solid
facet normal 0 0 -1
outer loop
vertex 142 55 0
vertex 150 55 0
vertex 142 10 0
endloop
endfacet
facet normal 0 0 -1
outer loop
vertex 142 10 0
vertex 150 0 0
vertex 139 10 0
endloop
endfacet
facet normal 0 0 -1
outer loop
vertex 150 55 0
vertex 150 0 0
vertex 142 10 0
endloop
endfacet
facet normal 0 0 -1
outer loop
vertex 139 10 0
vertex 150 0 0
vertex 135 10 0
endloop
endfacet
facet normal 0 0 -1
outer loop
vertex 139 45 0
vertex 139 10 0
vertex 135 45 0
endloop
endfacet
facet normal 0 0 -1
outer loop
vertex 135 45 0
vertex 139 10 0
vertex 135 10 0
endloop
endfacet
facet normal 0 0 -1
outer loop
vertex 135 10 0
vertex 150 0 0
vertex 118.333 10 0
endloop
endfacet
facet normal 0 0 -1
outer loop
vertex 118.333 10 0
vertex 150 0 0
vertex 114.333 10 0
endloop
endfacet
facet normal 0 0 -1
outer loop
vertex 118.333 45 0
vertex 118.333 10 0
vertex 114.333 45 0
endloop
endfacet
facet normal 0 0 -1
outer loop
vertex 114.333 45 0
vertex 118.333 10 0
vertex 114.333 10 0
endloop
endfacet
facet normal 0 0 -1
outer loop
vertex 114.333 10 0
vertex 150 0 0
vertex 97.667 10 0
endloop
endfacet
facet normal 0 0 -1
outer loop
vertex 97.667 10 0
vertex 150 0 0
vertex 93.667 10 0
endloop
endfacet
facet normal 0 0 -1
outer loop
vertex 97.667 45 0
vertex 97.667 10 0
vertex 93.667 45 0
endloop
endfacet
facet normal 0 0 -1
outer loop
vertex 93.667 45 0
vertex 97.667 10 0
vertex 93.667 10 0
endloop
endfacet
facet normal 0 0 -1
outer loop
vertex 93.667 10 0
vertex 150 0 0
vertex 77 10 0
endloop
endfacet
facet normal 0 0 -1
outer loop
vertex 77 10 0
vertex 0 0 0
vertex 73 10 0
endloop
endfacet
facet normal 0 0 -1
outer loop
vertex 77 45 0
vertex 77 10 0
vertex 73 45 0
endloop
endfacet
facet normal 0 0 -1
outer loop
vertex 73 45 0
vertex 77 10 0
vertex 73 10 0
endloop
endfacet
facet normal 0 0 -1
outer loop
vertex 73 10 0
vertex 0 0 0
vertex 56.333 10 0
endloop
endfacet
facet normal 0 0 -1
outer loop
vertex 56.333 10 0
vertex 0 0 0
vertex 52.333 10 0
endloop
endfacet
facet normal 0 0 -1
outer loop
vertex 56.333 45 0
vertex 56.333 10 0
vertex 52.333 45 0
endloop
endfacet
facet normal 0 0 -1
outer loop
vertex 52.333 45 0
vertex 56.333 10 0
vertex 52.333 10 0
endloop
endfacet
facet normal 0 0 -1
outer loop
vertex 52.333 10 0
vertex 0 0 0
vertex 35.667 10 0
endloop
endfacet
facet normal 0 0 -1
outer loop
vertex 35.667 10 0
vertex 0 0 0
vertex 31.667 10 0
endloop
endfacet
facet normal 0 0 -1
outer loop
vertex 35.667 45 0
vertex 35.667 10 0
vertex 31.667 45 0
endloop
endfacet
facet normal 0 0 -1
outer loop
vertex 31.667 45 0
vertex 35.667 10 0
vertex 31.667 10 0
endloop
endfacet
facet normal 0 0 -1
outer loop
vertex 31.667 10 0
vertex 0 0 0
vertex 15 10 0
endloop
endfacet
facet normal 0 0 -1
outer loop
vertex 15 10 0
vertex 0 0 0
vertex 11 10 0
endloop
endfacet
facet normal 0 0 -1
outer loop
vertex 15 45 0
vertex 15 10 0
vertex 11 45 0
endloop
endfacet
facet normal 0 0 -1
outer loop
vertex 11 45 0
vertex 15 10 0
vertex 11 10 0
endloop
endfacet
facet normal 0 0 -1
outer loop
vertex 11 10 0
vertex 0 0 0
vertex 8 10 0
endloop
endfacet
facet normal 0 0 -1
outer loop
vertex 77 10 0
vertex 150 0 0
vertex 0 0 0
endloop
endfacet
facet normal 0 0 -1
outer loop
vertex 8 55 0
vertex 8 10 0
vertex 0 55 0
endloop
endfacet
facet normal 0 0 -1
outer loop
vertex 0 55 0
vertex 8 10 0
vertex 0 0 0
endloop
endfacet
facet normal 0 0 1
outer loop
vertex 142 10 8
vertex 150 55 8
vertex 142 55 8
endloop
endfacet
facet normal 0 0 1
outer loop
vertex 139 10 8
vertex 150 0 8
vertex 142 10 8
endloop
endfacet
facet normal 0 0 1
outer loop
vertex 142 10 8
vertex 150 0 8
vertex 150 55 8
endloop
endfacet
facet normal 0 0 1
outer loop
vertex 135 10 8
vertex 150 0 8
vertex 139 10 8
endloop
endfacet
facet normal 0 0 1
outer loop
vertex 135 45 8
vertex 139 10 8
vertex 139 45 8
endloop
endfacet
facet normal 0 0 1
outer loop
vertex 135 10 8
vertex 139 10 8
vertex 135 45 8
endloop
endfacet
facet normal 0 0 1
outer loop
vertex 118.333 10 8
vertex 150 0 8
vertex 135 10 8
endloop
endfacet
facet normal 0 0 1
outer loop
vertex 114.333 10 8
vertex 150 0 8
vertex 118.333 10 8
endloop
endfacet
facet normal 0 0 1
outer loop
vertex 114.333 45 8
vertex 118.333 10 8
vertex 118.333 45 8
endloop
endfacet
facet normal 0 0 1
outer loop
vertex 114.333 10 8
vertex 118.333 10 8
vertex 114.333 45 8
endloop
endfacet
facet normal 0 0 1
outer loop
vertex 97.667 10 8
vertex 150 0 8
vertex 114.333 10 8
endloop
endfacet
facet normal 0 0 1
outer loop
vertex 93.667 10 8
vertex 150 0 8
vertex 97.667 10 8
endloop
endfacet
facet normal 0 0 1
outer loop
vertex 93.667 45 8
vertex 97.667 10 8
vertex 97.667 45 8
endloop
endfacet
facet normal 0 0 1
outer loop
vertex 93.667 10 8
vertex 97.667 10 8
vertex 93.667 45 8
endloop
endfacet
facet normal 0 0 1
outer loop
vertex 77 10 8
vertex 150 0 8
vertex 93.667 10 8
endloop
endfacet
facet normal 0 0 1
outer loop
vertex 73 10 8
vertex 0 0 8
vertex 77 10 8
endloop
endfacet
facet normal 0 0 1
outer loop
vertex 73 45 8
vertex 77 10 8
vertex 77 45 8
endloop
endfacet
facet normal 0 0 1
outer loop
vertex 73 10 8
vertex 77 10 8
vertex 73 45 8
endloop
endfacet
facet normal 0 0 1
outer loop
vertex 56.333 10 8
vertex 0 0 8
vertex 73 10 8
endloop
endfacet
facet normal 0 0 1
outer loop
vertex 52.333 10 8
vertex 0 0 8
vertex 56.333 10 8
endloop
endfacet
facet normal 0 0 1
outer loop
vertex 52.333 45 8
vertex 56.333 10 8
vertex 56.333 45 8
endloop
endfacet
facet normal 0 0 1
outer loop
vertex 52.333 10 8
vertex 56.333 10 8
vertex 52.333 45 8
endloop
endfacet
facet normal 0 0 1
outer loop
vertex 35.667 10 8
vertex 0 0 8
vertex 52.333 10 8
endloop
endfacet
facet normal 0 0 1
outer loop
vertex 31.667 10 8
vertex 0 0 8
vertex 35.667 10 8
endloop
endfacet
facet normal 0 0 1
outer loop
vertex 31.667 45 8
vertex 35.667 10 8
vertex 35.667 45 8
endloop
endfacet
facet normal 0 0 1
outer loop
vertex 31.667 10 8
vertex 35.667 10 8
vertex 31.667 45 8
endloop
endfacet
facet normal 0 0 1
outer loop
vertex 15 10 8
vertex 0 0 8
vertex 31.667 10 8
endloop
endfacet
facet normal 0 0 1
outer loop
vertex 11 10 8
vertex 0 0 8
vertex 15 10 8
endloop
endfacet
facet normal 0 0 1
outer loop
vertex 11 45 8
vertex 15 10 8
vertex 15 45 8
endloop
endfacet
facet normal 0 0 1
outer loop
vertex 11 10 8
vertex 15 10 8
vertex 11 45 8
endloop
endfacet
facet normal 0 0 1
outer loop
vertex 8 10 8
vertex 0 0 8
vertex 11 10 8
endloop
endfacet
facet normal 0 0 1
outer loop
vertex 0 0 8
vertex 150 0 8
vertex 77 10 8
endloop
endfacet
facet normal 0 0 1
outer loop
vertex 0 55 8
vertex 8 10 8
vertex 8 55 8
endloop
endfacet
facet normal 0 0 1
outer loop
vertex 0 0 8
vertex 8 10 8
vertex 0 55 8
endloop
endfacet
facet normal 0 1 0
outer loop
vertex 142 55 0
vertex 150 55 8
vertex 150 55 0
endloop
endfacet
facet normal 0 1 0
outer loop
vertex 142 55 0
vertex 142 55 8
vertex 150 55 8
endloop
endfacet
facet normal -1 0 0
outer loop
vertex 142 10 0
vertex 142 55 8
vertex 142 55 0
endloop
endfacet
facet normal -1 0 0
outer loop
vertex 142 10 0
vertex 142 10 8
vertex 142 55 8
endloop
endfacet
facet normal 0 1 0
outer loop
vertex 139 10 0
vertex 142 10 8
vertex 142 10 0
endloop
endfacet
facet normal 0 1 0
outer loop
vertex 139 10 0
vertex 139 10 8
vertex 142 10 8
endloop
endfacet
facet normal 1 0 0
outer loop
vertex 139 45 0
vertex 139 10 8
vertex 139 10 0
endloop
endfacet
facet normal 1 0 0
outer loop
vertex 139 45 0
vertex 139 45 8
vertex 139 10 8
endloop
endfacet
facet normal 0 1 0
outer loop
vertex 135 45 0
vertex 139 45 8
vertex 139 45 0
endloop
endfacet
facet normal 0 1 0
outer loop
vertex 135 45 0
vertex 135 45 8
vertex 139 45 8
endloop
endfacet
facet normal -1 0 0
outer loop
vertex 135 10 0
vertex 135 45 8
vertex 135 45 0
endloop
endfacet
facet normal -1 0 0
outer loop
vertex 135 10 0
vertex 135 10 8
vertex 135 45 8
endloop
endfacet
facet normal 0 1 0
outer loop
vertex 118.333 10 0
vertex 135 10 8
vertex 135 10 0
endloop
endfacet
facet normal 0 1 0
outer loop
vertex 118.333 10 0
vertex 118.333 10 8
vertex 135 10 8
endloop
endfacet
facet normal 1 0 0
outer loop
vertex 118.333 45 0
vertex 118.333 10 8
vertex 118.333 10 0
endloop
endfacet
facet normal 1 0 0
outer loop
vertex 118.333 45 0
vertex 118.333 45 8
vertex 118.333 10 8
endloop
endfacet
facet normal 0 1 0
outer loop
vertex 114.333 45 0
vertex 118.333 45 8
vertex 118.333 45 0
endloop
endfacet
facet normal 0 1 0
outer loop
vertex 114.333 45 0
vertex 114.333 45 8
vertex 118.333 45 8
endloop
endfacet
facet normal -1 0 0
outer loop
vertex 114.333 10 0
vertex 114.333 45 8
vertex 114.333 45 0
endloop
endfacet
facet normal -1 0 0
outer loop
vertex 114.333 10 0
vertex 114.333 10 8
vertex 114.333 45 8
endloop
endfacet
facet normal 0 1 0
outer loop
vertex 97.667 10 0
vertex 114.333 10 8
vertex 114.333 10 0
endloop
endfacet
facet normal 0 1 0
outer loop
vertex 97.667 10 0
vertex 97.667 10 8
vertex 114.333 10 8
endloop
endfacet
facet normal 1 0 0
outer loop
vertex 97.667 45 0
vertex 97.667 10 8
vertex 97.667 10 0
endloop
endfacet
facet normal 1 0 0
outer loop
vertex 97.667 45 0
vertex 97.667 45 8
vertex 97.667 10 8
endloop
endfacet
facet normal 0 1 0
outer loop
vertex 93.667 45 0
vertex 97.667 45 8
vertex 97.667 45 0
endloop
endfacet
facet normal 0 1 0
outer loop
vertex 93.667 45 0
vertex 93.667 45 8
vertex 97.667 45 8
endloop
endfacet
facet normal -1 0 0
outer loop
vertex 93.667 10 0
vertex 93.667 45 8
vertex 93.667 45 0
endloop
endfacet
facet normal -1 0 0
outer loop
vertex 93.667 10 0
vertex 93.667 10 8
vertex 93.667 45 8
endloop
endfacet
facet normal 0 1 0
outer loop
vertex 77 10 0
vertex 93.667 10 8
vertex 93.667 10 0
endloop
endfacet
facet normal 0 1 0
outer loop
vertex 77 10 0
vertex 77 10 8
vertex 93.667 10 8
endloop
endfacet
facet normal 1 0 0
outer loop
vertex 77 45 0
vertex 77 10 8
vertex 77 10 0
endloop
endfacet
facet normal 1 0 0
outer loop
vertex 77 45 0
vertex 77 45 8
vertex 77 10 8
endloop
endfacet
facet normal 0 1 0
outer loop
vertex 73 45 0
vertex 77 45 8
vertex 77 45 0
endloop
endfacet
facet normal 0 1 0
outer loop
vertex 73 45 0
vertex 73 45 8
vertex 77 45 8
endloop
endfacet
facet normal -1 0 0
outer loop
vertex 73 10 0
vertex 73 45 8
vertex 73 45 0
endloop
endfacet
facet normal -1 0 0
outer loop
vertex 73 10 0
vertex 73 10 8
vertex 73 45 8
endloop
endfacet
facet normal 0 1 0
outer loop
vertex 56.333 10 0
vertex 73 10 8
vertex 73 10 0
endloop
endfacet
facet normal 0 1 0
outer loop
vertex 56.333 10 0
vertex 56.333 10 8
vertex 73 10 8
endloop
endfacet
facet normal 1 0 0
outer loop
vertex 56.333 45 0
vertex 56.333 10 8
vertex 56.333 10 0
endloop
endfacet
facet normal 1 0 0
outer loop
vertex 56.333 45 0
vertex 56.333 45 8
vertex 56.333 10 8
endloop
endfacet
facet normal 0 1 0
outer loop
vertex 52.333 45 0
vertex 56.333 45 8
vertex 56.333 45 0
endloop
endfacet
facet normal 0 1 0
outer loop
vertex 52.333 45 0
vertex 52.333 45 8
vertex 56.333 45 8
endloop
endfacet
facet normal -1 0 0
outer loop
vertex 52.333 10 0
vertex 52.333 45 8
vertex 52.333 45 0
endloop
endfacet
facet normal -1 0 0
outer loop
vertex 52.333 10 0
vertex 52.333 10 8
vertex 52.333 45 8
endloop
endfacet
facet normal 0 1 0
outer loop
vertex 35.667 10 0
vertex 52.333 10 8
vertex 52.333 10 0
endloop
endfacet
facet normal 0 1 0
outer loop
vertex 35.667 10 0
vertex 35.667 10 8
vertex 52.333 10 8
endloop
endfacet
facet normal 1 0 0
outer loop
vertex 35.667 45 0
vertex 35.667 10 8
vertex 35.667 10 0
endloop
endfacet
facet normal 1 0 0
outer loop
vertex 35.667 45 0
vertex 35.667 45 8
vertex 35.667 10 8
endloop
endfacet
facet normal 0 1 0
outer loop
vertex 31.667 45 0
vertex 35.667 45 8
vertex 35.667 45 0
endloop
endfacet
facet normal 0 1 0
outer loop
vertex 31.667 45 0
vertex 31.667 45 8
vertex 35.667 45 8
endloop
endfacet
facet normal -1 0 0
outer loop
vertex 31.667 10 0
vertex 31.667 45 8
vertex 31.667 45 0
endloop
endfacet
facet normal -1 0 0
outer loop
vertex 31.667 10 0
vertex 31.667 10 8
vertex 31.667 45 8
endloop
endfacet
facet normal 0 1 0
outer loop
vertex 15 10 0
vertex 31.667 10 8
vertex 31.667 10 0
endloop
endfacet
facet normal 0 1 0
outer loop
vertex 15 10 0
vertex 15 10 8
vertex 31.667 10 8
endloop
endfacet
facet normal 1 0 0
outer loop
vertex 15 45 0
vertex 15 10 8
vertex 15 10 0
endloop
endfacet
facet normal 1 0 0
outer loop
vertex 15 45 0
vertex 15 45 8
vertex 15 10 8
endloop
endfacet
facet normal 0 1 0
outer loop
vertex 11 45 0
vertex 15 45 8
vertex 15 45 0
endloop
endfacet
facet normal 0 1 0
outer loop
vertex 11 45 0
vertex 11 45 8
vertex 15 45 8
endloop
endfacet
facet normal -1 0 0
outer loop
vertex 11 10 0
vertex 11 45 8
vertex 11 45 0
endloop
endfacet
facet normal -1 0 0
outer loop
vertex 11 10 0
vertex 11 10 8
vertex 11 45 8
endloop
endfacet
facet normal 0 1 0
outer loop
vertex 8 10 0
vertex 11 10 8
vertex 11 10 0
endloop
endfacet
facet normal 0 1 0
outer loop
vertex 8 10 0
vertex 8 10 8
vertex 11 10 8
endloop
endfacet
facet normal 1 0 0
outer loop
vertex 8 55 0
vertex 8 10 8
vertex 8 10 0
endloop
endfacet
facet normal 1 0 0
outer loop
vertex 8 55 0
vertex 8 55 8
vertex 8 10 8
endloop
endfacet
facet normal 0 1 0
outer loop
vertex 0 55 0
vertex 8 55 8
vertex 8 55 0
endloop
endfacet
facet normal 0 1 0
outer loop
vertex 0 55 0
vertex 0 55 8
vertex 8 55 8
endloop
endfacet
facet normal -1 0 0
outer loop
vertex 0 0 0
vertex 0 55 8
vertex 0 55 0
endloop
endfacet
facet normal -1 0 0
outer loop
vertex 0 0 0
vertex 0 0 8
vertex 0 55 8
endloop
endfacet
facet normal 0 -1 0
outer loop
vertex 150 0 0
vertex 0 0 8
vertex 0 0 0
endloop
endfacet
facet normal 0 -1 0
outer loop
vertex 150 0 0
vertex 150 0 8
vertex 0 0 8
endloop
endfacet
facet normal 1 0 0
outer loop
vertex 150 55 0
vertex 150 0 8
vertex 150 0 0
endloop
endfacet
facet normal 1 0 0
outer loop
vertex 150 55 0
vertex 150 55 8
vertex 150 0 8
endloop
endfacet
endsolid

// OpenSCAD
$fn = 32;

// ----------------------------------------------------------------------
// Guard grille: 7 slats over a 150 x 55 mm plate
// ----------------------------------------------------------------------

// --- parameters (mm) ---
profile_height = 8;       // extrusion height
profile_points = 36;      // points of the closed outline

profile = [[0, 0], [150, 0], [150, 55], [142, 55], [142, 10], [139, 10], [139, 45], [135, 45], [135, 10], [118.333, 10], [118.333, 45], [114.333, 45], [114.333, 10], [97.667, 10], [97.667, 45], [93.667, 45], [93.667, 10], [77, 10], [77, 45], [73, 45], [73, 10], [56.333, 10], [56.333, 45], [52.333, 45], [52.333, 10], [35.667, 10], [35.667, 45], [31.667, 45], [31.667, 10], [15, 10], [15, 45], [11, 45], [11, 10], [8, 10], [8, 55], [0, 55]];  // single closed polygon, 36 points, counter clockwise

// --- the one profile operation ---
linear_extrude(height = profile_height) polygon(points = profile);
